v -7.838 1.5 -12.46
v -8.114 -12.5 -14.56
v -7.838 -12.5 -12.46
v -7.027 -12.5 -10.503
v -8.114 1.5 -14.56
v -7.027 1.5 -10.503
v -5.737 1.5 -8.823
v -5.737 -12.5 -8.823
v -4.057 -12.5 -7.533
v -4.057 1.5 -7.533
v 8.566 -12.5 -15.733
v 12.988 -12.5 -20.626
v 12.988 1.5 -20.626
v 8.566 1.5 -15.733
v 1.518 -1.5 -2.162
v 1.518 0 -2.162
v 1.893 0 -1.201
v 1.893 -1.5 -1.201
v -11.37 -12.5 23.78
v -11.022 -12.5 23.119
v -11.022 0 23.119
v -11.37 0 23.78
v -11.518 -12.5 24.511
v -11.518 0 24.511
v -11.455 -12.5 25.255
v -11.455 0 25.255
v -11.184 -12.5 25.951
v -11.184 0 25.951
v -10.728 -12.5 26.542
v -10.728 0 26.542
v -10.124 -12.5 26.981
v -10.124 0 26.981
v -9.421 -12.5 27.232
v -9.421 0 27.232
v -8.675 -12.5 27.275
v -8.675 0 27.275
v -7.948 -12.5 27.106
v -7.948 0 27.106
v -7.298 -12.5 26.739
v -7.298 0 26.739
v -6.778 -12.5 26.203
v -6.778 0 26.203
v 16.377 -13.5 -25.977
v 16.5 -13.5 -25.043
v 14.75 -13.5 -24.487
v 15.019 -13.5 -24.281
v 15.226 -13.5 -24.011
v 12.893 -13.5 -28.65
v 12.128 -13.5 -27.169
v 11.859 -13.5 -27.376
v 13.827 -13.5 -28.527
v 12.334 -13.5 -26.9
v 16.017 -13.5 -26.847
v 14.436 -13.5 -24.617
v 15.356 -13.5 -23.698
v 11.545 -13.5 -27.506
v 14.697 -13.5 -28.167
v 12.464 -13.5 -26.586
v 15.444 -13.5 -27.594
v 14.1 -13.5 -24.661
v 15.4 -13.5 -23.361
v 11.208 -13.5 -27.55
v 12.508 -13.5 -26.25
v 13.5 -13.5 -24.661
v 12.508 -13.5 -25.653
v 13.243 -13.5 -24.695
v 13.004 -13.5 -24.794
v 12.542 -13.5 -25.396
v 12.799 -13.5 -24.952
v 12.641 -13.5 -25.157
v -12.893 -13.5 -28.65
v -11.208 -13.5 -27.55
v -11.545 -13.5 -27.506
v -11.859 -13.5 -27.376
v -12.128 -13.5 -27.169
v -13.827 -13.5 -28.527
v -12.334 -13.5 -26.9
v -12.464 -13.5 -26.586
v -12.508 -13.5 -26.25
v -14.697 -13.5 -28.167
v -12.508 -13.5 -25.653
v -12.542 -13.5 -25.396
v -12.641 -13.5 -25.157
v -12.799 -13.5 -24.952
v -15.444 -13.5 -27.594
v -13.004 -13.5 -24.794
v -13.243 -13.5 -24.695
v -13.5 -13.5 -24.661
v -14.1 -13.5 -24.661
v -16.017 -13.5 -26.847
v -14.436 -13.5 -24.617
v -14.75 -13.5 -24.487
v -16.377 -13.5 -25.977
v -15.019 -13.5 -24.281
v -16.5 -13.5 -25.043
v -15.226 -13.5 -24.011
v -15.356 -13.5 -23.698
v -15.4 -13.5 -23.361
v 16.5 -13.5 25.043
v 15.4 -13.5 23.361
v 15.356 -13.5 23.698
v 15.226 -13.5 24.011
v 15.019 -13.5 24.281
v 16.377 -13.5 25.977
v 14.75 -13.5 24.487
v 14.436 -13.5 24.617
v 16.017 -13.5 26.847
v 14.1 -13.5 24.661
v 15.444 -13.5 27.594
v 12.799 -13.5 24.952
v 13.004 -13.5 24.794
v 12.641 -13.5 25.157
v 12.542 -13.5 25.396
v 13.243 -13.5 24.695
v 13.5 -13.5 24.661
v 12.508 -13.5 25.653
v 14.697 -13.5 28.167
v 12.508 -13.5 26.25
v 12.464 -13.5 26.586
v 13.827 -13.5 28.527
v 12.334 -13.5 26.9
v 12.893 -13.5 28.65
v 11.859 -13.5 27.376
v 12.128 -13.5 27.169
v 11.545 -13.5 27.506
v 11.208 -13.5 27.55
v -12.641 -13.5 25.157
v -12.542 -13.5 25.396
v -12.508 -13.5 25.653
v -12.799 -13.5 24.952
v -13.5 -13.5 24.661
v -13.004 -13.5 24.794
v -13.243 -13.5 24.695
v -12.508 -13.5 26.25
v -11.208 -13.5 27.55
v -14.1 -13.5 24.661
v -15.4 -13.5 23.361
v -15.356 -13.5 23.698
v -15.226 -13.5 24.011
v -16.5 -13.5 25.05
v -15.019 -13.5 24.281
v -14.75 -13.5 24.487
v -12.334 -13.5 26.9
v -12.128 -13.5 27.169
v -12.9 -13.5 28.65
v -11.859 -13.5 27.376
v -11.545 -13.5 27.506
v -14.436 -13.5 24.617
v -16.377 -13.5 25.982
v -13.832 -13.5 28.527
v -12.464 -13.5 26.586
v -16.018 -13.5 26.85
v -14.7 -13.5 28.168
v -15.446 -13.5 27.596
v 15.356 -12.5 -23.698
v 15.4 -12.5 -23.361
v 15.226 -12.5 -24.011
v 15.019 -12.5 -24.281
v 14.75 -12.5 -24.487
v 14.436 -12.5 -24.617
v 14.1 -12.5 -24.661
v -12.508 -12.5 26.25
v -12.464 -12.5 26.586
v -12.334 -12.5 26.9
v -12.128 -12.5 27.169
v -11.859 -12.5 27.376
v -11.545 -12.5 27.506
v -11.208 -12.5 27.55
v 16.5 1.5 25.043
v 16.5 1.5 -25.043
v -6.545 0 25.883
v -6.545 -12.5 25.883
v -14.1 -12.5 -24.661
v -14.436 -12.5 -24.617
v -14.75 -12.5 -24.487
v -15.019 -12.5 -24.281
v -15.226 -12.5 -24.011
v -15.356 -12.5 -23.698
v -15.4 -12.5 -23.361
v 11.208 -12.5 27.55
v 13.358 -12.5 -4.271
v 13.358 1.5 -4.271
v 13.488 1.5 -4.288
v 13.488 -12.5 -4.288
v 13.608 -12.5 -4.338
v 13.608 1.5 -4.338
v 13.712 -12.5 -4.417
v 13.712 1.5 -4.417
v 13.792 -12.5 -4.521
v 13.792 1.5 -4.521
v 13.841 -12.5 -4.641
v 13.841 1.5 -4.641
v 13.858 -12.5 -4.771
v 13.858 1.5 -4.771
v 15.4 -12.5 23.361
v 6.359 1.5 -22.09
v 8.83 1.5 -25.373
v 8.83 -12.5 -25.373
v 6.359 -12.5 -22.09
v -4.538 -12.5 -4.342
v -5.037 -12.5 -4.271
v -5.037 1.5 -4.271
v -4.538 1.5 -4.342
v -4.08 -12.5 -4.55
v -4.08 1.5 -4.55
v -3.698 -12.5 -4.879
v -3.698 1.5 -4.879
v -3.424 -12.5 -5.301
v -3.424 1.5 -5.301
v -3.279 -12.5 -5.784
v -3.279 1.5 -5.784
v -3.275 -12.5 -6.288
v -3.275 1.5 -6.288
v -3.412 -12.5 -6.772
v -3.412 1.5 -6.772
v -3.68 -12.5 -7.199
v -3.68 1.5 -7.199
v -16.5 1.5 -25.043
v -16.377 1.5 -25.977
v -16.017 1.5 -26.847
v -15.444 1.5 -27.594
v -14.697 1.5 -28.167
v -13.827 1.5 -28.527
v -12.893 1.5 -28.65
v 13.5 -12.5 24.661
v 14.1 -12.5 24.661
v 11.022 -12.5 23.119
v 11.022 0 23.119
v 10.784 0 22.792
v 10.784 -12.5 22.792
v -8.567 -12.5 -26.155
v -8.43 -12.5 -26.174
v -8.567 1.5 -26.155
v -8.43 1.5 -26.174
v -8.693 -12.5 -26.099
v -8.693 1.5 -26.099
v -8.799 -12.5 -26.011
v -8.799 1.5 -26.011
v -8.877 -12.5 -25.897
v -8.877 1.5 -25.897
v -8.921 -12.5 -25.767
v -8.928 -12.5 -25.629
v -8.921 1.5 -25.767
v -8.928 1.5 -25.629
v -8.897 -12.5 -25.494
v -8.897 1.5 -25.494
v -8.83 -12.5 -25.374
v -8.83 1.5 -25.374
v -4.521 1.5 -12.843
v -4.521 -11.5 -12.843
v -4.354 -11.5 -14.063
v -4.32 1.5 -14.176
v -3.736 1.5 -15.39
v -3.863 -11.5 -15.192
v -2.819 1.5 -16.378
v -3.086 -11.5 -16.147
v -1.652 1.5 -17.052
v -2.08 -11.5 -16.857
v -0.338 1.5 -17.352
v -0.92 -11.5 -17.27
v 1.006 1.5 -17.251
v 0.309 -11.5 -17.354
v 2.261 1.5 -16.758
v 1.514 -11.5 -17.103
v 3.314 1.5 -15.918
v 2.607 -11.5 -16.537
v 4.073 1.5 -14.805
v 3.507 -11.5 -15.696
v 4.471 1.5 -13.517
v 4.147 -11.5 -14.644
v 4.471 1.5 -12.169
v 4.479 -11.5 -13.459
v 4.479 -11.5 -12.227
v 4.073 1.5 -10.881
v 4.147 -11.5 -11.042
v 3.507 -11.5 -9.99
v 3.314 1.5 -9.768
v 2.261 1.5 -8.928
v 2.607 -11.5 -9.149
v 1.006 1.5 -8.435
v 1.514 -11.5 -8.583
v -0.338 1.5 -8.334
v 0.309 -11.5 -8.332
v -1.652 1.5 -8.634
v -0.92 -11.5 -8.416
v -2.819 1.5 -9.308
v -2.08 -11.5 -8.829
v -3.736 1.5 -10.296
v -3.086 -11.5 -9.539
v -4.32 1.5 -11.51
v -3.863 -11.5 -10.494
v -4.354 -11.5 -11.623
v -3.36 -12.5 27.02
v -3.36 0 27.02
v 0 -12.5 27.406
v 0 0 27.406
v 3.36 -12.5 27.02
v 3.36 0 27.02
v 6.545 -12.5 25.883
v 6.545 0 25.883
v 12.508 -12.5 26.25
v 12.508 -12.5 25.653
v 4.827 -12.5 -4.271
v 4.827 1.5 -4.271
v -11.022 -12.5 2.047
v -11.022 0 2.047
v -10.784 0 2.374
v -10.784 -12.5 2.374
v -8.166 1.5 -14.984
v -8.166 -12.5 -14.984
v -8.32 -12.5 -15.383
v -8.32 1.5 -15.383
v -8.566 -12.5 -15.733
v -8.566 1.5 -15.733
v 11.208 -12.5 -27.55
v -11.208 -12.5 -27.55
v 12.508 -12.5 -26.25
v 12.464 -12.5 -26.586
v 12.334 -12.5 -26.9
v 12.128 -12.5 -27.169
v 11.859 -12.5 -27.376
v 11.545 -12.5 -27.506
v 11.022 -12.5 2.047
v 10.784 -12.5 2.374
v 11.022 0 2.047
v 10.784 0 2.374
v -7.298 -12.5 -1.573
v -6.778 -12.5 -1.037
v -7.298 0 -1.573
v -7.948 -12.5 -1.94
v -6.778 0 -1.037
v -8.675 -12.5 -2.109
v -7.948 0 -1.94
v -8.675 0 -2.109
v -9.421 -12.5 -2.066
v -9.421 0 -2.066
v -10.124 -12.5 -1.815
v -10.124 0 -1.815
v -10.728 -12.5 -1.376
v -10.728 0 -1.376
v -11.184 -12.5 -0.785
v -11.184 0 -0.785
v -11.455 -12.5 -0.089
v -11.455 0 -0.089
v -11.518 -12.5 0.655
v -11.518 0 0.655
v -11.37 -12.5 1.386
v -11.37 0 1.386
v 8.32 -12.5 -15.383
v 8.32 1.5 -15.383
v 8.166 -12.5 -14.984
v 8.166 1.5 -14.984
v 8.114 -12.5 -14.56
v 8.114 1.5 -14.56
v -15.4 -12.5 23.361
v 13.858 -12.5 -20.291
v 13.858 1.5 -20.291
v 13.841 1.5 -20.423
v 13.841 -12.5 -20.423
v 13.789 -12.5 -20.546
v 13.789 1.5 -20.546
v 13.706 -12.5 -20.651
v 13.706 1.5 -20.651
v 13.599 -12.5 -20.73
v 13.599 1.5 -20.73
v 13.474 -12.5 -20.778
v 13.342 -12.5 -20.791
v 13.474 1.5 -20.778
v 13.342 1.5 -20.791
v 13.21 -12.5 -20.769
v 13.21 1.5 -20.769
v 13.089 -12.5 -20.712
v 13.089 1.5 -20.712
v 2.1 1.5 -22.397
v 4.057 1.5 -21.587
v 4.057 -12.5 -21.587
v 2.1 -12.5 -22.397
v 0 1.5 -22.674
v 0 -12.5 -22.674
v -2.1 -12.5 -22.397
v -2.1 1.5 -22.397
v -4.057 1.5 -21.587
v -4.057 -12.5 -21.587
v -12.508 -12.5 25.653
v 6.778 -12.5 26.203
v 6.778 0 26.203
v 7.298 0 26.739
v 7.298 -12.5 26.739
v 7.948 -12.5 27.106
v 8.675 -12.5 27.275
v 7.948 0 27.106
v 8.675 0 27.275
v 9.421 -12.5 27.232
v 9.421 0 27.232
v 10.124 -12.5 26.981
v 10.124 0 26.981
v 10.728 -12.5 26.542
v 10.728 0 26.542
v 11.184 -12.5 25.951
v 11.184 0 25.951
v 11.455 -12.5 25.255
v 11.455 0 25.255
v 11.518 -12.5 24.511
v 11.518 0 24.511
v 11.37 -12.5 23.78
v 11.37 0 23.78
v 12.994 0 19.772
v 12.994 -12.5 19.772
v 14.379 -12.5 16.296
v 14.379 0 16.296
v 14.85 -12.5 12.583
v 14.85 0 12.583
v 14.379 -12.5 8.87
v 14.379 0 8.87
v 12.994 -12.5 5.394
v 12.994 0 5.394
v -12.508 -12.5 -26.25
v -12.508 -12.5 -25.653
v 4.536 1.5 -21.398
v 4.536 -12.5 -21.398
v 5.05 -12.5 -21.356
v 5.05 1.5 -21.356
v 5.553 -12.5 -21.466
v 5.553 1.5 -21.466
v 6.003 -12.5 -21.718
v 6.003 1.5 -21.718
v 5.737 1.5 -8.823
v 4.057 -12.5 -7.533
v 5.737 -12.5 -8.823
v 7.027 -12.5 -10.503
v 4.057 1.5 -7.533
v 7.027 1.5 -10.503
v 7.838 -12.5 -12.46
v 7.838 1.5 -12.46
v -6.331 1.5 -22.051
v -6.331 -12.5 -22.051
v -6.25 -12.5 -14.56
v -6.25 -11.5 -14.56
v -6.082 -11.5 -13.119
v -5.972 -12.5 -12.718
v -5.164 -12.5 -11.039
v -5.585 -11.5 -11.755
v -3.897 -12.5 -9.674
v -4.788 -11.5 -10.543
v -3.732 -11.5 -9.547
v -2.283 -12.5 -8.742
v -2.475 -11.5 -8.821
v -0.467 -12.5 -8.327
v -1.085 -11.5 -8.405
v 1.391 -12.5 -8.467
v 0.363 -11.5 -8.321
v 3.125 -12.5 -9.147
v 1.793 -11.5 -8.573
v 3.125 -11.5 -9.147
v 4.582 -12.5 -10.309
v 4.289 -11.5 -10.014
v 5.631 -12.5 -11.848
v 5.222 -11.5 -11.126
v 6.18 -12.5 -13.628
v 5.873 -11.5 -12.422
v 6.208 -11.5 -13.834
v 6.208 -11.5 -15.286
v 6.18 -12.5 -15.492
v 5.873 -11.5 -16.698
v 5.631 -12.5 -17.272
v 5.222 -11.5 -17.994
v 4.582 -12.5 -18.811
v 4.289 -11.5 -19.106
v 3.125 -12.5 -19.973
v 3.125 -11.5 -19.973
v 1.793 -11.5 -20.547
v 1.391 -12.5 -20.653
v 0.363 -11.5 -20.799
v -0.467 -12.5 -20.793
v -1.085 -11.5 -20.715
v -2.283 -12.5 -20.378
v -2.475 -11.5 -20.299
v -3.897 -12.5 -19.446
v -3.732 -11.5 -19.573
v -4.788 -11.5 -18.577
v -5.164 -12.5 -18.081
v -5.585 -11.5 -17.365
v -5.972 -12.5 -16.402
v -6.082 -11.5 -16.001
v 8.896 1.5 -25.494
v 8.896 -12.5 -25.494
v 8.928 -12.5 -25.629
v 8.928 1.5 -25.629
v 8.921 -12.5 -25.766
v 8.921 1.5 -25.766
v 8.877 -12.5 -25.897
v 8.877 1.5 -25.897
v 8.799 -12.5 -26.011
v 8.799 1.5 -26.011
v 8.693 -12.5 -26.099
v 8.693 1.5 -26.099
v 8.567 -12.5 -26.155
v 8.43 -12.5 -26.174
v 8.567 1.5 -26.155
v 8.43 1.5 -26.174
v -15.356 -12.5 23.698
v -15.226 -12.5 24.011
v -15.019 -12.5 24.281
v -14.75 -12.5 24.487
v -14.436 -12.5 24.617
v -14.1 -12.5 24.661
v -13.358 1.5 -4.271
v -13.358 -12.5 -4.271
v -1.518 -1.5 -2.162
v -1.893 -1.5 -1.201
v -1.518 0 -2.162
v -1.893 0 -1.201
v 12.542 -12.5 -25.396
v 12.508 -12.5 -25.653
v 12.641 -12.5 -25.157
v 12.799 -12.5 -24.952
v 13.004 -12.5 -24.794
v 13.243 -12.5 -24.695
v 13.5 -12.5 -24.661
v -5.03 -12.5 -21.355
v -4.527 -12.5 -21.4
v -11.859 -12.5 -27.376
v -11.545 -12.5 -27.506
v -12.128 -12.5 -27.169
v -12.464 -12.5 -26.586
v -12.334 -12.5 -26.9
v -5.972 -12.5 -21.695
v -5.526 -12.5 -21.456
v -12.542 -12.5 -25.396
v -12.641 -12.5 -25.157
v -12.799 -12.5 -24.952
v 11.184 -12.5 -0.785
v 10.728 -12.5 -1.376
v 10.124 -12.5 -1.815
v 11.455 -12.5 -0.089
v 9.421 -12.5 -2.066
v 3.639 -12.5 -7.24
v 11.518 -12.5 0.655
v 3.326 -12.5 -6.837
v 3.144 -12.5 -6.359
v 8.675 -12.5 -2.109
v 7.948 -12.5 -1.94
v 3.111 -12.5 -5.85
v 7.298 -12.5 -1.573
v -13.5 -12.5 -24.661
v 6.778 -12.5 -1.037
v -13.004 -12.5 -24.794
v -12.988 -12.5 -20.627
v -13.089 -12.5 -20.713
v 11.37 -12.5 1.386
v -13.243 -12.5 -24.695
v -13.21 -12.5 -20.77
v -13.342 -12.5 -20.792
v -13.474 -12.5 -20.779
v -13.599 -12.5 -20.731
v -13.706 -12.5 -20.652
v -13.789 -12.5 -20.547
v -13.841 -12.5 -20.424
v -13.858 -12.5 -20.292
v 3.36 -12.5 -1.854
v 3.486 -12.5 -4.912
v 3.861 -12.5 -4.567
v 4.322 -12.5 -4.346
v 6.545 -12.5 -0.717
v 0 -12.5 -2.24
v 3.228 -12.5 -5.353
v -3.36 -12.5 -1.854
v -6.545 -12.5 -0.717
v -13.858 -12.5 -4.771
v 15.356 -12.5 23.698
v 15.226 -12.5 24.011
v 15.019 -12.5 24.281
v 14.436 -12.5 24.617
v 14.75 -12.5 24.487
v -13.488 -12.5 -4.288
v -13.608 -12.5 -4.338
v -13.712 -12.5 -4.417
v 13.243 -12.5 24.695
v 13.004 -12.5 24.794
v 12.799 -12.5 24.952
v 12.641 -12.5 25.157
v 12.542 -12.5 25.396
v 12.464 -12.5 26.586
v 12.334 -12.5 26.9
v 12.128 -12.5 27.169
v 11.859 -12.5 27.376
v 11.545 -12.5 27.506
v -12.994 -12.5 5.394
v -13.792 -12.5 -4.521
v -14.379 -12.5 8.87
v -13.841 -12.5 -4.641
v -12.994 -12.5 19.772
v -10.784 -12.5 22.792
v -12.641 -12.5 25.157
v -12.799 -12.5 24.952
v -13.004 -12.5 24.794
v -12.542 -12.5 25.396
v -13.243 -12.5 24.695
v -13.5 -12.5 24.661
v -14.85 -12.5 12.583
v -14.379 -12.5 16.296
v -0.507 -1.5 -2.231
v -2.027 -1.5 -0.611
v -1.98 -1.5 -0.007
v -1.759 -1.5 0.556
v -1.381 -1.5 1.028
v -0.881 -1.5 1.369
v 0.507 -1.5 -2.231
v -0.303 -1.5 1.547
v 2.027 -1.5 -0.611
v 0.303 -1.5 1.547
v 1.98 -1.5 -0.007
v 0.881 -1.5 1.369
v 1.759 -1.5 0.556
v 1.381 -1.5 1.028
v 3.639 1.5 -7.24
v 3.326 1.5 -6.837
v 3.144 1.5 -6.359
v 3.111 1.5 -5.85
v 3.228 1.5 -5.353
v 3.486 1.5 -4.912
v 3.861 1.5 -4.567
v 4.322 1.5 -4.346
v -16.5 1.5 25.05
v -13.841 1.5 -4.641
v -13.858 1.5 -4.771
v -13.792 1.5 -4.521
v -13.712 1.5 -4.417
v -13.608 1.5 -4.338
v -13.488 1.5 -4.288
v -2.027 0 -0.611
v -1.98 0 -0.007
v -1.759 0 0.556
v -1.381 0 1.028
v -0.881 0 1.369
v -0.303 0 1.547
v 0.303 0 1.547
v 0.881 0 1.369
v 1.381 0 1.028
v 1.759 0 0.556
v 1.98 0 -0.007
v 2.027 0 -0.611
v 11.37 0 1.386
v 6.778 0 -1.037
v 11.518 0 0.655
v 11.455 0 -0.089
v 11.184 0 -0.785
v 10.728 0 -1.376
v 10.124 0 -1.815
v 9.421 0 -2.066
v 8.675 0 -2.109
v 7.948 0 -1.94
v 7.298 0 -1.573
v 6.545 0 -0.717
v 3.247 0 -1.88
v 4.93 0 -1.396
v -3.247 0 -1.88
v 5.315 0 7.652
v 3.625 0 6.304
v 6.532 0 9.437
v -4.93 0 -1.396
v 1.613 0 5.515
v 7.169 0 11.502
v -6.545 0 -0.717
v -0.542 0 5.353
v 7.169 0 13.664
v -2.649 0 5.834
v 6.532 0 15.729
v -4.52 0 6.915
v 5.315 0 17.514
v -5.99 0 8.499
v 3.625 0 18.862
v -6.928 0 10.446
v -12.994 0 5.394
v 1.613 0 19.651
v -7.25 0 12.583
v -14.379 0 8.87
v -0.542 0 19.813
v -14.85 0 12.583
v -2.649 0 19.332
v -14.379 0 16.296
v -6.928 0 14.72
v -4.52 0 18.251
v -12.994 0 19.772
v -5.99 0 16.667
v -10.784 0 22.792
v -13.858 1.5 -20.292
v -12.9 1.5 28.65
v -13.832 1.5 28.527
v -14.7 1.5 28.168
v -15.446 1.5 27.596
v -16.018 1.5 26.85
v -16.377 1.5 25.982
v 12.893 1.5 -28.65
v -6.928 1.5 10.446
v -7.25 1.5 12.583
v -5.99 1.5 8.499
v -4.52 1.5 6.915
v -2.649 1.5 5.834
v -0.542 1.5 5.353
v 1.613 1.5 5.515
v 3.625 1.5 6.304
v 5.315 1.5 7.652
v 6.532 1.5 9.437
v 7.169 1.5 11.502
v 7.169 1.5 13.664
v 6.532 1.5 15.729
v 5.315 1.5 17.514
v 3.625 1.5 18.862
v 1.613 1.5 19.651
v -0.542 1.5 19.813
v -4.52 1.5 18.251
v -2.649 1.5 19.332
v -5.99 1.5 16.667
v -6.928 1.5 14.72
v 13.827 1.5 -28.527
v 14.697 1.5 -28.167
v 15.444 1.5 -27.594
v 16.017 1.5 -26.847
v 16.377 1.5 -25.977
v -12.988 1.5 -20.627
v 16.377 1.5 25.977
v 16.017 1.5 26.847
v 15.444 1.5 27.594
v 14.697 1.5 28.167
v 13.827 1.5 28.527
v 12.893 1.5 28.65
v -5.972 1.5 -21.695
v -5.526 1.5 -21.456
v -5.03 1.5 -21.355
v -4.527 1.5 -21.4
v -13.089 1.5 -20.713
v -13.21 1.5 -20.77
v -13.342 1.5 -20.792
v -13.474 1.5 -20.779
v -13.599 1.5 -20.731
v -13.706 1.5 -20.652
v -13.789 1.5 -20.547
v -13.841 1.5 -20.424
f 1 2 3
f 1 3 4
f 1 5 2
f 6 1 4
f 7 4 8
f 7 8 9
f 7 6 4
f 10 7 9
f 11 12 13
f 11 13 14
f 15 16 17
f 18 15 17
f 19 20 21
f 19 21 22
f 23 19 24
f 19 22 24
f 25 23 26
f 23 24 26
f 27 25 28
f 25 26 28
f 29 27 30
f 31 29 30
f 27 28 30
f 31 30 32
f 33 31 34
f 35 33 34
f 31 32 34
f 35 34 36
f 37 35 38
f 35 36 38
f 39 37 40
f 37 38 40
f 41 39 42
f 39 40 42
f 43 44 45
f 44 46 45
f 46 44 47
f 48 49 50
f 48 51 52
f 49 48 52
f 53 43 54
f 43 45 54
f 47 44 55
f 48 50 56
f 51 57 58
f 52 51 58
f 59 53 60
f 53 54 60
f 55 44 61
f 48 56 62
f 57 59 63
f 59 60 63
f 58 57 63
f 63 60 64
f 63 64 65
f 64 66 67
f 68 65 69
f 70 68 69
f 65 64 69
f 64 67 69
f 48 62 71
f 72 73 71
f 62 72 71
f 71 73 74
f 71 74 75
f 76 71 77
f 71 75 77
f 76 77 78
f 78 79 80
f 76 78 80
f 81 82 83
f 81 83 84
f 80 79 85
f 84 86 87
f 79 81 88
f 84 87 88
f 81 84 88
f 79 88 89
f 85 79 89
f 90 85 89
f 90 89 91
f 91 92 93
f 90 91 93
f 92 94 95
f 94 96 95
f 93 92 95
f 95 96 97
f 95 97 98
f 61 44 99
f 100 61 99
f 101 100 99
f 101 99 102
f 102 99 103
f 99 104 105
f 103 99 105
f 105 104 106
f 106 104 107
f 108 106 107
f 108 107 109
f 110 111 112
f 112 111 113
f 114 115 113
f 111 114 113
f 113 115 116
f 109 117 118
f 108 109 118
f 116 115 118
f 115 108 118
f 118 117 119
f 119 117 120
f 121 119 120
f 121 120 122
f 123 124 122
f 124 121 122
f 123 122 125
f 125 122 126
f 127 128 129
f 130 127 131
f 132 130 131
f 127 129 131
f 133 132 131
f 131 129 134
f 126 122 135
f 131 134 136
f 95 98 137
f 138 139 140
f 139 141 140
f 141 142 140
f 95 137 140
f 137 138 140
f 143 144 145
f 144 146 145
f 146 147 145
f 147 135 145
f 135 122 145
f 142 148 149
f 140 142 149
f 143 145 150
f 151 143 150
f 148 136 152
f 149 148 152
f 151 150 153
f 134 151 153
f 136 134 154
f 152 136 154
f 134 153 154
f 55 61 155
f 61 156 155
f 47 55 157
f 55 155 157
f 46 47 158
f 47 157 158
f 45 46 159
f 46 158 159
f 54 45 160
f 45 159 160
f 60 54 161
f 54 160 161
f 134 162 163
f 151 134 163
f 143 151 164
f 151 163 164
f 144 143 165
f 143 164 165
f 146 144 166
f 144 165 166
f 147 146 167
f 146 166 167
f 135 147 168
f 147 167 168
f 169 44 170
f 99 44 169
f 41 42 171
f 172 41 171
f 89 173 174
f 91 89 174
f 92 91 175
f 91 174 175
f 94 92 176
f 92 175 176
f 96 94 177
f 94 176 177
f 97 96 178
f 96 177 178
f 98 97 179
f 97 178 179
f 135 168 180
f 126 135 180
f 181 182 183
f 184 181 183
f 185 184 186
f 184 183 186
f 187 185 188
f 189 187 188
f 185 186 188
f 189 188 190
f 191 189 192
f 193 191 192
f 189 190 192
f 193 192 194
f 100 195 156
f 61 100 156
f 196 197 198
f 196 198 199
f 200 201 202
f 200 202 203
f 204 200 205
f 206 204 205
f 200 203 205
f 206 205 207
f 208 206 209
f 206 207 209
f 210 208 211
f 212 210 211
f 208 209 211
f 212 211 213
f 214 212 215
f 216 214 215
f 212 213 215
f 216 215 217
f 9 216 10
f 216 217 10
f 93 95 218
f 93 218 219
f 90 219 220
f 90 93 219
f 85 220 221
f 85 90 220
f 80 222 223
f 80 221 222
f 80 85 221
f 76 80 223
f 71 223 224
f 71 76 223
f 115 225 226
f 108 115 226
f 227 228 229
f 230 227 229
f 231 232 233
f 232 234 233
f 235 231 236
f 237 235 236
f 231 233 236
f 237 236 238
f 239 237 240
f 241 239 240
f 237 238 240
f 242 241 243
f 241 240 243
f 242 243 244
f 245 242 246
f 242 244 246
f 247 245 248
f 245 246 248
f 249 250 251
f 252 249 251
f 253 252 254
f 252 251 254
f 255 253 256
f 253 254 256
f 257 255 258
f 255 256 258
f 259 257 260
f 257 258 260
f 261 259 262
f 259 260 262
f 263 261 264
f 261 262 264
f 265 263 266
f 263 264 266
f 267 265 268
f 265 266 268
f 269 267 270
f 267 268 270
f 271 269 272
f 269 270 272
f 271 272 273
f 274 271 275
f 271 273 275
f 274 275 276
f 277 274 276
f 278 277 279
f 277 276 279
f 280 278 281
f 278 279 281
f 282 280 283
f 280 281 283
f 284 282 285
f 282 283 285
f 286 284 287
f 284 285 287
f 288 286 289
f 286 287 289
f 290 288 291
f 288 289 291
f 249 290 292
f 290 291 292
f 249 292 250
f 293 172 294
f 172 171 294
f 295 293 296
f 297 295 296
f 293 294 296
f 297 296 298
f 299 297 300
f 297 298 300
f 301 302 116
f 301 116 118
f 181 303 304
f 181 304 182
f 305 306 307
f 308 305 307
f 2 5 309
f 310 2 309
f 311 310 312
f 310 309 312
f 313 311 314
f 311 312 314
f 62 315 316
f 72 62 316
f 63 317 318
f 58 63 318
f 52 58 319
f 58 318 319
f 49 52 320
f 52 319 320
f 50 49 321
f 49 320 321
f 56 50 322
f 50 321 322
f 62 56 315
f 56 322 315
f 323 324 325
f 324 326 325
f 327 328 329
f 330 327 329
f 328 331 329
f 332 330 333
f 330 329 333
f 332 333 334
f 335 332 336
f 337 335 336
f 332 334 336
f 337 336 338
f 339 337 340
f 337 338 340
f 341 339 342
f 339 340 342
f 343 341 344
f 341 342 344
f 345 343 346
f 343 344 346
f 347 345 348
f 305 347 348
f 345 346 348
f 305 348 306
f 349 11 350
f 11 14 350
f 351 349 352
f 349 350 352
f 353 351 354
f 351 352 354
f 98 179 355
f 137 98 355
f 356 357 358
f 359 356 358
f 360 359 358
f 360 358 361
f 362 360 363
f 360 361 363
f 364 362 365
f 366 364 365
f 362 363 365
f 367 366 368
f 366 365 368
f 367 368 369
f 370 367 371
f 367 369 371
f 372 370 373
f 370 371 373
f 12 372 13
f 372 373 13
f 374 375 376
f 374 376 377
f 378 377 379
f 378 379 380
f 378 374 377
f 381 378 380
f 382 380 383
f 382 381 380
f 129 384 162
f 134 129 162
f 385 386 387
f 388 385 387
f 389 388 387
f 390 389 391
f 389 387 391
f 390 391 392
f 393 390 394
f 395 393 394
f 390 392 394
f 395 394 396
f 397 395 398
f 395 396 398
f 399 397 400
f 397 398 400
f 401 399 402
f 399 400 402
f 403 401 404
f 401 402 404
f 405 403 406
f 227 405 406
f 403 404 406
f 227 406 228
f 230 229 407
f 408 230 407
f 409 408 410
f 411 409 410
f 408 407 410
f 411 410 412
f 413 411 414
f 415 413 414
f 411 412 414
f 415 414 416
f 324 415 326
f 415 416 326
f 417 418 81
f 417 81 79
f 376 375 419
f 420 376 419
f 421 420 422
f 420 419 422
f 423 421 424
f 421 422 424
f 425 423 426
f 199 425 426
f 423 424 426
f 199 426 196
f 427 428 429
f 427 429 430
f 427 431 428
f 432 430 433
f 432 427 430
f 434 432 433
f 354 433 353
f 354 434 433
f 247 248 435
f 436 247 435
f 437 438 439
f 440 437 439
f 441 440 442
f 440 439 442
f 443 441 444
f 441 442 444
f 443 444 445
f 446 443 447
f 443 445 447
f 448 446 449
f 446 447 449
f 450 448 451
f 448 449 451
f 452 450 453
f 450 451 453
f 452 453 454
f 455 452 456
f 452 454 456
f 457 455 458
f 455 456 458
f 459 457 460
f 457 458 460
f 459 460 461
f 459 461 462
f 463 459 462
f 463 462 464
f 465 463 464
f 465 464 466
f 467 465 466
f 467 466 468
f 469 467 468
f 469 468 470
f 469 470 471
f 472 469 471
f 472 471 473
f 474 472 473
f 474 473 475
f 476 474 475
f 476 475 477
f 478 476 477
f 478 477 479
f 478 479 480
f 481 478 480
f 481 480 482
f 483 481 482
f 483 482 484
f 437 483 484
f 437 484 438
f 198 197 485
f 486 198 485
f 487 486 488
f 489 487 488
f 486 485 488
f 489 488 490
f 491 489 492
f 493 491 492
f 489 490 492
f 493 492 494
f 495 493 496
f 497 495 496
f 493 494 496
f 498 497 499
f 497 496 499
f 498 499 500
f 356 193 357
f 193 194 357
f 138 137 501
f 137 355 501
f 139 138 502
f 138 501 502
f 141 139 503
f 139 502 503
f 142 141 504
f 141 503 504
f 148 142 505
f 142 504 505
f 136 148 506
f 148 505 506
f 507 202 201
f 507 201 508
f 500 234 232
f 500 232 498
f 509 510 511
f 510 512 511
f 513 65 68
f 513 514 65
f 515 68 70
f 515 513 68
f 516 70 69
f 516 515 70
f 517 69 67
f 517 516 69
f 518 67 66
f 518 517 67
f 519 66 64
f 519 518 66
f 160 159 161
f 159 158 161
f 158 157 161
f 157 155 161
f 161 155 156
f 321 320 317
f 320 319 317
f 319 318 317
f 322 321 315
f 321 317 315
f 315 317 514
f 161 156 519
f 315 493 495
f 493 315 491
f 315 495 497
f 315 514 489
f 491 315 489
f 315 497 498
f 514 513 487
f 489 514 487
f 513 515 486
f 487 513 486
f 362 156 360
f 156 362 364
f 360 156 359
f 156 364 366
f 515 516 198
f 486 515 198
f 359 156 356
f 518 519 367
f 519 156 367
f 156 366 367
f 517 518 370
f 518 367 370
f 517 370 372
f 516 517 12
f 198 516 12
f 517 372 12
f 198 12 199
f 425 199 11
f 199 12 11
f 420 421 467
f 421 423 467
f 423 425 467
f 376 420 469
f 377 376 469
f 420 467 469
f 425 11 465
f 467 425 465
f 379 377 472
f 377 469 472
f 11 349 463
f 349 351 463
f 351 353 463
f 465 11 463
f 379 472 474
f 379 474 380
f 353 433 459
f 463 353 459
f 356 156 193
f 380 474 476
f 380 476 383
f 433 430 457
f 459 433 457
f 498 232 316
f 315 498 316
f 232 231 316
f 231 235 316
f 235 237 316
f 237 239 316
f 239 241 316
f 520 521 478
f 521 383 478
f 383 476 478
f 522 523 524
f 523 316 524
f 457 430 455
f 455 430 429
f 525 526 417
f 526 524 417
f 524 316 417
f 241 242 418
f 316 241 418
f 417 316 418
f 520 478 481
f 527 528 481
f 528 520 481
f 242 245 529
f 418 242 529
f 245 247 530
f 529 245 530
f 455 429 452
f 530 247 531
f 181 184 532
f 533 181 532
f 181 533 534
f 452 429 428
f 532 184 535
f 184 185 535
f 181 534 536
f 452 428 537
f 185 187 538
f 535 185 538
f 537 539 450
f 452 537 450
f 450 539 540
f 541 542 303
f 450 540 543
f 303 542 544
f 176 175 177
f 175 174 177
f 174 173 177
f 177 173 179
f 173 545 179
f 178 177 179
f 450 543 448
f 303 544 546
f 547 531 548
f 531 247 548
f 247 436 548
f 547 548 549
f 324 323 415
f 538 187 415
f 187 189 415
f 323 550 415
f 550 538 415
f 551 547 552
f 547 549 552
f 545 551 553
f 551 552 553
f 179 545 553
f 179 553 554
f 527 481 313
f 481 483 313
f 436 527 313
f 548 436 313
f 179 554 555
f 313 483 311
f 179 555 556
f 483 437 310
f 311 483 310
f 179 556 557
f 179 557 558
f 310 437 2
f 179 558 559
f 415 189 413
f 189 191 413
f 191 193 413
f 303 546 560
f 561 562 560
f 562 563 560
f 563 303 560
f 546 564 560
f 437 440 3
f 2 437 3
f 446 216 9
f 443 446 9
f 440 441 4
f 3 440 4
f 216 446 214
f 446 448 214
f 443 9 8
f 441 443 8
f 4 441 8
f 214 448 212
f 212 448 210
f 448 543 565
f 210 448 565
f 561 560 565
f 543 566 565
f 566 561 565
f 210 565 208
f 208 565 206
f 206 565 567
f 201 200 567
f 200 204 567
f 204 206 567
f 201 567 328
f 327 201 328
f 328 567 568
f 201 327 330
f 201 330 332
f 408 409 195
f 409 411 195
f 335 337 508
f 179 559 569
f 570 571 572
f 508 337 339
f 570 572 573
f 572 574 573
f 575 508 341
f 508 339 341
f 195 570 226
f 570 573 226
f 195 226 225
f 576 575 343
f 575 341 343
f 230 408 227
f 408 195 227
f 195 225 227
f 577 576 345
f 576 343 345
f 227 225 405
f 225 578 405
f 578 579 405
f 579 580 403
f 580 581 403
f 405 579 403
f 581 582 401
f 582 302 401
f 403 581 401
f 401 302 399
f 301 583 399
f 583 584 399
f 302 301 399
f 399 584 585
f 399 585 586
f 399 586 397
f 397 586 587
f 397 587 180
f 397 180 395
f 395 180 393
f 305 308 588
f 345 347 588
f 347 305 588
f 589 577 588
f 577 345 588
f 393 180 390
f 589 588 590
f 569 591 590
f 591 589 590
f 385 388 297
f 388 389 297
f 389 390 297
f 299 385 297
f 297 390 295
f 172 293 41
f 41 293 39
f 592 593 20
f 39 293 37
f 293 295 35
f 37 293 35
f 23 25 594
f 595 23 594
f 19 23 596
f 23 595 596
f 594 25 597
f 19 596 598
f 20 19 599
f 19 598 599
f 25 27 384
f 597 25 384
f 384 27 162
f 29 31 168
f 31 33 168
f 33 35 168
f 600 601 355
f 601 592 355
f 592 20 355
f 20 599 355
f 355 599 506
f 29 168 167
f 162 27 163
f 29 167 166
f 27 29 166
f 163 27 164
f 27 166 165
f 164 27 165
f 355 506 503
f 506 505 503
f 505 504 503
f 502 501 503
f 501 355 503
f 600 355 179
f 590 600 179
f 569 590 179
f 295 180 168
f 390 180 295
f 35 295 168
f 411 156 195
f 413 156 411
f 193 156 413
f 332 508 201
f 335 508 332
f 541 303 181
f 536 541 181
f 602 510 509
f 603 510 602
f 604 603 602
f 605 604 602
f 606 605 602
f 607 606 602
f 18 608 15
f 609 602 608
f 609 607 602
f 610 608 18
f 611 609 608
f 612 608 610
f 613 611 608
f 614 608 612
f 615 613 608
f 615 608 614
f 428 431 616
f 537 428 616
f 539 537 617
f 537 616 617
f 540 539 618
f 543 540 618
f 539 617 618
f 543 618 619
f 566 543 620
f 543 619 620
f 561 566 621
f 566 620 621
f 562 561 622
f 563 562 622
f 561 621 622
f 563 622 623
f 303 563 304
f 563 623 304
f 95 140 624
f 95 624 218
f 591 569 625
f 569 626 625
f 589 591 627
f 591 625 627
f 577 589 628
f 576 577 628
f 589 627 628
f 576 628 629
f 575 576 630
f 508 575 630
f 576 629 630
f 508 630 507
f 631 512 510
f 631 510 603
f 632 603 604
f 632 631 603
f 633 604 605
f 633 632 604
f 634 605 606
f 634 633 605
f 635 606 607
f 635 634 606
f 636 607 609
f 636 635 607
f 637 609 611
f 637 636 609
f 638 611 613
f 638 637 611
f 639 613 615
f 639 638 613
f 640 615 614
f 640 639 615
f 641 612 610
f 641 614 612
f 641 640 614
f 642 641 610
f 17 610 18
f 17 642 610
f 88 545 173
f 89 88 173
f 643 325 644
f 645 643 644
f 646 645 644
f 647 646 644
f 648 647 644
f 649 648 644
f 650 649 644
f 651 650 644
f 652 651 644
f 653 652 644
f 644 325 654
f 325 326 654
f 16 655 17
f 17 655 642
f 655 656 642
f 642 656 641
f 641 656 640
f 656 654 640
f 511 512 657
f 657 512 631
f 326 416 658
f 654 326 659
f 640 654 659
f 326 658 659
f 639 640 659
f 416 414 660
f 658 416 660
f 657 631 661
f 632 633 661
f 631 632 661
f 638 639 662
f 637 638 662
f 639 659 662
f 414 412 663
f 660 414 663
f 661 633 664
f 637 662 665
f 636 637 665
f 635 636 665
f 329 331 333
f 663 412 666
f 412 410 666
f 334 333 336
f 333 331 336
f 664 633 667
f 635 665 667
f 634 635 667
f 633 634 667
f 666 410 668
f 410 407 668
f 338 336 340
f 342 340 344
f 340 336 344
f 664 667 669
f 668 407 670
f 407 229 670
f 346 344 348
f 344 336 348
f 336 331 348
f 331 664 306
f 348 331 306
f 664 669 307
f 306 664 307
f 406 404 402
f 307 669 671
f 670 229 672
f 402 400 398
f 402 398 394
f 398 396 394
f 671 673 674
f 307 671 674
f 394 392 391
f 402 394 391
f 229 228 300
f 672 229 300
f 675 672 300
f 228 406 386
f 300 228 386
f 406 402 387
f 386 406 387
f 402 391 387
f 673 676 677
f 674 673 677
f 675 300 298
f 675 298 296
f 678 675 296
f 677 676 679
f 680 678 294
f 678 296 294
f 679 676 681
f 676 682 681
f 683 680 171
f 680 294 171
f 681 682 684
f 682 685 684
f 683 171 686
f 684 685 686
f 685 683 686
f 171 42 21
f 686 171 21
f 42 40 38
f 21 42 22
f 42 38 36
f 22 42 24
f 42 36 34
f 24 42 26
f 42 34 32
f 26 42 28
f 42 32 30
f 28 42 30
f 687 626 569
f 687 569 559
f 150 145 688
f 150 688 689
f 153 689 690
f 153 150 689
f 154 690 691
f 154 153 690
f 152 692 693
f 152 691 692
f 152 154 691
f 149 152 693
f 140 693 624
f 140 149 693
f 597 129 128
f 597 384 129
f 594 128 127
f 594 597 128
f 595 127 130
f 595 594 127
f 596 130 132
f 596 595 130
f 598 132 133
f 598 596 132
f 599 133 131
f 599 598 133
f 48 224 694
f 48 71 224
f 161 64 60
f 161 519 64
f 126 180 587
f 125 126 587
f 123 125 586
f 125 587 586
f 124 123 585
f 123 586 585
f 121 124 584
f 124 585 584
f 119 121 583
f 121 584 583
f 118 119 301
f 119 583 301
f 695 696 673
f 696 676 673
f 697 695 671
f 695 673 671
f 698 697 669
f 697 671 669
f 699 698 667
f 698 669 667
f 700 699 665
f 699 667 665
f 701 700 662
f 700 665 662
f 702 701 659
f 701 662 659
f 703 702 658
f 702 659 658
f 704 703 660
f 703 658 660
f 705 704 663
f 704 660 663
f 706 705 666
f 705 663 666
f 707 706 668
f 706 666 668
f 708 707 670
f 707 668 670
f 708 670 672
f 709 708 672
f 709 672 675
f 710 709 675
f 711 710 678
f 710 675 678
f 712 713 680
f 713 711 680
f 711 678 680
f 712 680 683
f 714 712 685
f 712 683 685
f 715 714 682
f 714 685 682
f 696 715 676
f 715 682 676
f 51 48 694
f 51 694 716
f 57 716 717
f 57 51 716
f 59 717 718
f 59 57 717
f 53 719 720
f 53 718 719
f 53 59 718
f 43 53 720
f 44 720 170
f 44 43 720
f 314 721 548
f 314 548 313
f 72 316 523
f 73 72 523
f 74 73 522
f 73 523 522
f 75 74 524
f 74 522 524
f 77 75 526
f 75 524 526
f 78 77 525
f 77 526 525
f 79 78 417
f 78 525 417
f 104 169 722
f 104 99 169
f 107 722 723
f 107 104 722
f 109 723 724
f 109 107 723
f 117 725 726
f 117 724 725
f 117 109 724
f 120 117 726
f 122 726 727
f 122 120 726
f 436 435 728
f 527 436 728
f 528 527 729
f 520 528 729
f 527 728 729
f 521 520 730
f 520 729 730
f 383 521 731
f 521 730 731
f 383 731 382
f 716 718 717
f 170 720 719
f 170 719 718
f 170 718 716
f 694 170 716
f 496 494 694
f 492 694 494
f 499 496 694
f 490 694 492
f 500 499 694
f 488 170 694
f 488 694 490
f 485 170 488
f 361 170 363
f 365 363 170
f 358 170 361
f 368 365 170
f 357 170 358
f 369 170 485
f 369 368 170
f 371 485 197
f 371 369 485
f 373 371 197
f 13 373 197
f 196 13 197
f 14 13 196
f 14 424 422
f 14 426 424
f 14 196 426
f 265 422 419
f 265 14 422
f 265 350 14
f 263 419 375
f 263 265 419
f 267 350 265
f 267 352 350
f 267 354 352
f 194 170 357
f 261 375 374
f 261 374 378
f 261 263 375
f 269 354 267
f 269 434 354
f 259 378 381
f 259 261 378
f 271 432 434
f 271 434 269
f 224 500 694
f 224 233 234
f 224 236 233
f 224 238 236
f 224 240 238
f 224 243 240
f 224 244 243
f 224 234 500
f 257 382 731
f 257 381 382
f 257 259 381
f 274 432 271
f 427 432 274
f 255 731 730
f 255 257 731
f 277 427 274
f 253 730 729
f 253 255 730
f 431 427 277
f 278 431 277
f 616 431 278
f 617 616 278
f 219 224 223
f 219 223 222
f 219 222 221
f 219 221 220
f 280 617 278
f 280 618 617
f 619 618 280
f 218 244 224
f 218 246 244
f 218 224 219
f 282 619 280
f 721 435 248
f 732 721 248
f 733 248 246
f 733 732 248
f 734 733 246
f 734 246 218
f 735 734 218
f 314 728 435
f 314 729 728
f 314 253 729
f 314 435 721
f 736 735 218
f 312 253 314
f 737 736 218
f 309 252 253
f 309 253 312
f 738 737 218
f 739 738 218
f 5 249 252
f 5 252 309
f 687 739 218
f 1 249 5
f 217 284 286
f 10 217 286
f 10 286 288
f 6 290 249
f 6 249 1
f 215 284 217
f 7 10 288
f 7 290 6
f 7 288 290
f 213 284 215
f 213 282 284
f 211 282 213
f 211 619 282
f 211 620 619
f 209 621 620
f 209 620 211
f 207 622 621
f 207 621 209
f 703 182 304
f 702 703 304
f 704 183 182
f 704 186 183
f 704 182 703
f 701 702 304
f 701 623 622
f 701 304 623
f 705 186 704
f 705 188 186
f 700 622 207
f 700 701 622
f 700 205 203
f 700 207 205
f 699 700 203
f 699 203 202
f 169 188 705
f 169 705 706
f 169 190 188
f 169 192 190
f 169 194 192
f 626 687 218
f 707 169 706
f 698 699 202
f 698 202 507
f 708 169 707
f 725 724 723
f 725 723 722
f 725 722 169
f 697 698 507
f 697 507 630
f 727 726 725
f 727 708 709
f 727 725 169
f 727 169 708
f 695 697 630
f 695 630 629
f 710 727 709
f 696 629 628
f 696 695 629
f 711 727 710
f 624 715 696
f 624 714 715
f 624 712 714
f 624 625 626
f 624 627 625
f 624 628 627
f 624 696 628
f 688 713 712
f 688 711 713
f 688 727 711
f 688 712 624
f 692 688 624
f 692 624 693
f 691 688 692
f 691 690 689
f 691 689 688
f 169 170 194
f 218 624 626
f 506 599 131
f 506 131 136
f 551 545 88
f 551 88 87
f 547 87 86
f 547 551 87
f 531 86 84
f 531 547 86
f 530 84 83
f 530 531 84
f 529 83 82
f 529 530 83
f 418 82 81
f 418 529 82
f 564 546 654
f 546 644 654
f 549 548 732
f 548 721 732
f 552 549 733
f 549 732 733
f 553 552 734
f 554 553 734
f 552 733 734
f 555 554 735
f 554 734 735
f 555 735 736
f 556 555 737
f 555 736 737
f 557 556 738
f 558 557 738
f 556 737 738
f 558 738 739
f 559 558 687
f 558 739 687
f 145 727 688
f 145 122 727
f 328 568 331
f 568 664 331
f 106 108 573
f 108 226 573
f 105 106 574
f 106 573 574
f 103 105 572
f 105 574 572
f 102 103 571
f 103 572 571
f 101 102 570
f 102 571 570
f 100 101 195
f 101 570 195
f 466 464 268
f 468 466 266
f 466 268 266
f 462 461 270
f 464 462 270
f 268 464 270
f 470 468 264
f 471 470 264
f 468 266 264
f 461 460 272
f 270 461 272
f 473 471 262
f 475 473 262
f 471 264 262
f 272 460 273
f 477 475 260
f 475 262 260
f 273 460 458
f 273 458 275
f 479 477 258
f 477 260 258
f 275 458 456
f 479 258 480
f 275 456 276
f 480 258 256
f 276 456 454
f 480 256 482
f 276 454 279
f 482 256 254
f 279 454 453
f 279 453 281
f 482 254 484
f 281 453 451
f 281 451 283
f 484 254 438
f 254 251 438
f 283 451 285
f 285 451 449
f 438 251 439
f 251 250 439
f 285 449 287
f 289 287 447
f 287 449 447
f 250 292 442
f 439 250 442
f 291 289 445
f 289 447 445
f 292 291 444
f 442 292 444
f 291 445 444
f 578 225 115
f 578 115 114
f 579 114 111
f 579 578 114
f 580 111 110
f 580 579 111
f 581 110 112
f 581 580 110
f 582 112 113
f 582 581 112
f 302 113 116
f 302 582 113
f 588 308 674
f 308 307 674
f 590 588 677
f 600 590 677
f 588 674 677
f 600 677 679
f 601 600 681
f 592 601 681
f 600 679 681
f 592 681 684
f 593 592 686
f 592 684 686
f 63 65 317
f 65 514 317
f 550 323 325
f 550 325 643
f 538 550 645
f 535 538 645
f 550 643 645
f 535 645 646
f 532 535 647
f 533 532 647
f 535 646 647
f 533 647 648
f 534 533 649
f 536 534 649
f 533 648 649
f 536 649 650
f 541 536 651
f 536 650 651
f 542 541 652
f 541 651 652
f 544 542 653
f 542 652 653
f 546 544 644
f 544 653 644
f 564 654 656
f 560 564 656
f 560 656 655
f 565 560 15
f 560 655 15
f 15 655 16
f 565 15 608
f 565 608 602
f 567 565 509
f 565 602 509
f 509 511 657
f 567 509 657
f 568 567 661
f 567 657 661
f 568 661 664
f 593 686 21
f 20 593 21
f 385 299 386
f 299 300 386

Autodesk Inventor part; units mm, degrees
ref_plane "YZ Plane" through (0, 0, 0) normal (1, 0, 0) x (0, 1, 0)
ref_plane "XZ Plane" through (0, 0, 0) normal (0, 1, 0) x (-1, 0, 0)
ref_plane "XY Plane" through (0, 0, 0) normal (0, 0, 1) x (1, 0, 0)
sketch "Sketch5" plane through (0, 0, 0) normal (0, 1, 0) x (-1, 0, 0)
  line L0 (-12.8932, 28.65) -> (12.9, 28.65)
  line L1 (16.5, 25.05) -> (16.5, -25.0432)
  line L2 (12.8932, -28.65) -> (-12.8932, -28.65)
  line L3 (-16.5, -25.0432) -> (-16.5, 25.0432)
  line L4 (-16.5, 28.65) -> (16.5, -28.65) construction
  line L5 (16.5, 28.65) -> (-16.5, -28.65) construction
  arc A0 (16.5, 25.05) -> (12.9, 28.65) centre (12.9, 25.05) ccw
  line L6 (12.9, 28.65) -> (12.9, 25.05) construction
  line L7 (12.9, 25.05) -> (16.5, 25.05) construction
  arc A1 (12.8932, -28.65) -> (16.5, -25.0432) centre (12.8932, -25.0432) ccw
  arc A2 (-12.8932, 28.65) -> (-16.5, 25.0432) centre (-12.8932, 25.0432) ccw
  arc A3 (-16.5, -25.0432) -> (-12.8932, -28.65) centre (-12.8932, -25.0432) ccw
  circle A4 centre (13.5, 25.6528) radius 0.9915
  line L8 (11.2085, 27.55) -> (-11.2085, 27.55)
  arc A5 (-15.517, 25.05) -> (-15.517, 25.0432) centre (-12.8932, 25.0432) ccw
  line L9 (-15.4, 23.3613) -> (-15.4, -23.3613)
  line L10 (-11.2085, -27.55) -> (11.2085, -27.55)
  line L11 (15.4, -23.3613) -> (15.4, 23.3613)
  line L12 (12.5085, 25.6528) -> (12.5085, 26.25)
  line L13 (13.5, 24.6613) -> (14.1, 24.6613)
  arc A6 (12.5085, 26.25) -> (11.2085, 27.55) centre (11.2085, 26.25) ccw
  arc A7 (15.4, 23.3613) -> (14.1, 24.6613) centre (14.1, 23.3613) ccw
  line L14 (15.4, 0) -> (-15.4, 0) construction
  line L15 (0, 27.55) -> (0, -27.55) construction
  circle A8 centre (13.5, -25.6528) radius 0.9915
  line L16 (12.5085, -25.6528) -> (12.5085, -26.25)
  line L17 (13.5, -24.6613) -> (14.1, -24.6613)
  arc A9 (11.2085, -27.55) -> (12.5085, -26.25) centre (11.2085, -26.25) ccw
  arc A10 (14.1, -24.6613) -> (15.4, -23.3613) centre (14.1, -23.3613) ccw
  line L18 (0, -27.55) -> (0, 27.55) construction
  circle A11 centre (-13.5, 25.6528) radius 0.9915
  line L19 (-12.5085, 25.6528) -> (-12.5085, 26.25)
  line L20 (-13.5, 24.6613) -> (-14.1, 24.6613)
  arc A12 (-11.2085, 27.55) -> (-12.5085, 26.25) centre (-11.2085, 26.25) ccw
  arc A13 (-14.1, 24.6613) -> (-15.4, 23.3613) centre (-14.1, 23.3613) ccw
  arc A14 (-12.5085, -26.25) -> (-11.2085, -27.55) centre (-11.2085, -26.25) ccw
  line L21 (-12.5085, -25.6528) -> (-12.5085, -26.25)
  circle A15 centre (-13.5, -25.6528) radius 0.9915
  line L22 (-13.5, -24.6613) -> (-14.1, -24.6613)
  arc A16 (-15.4, -23.3613) -> (-14.1, -24.6613) centre (-14.1, -23.3613) ccw
  line L23 (-12.1355, -25.3386) -> (-12.1355, -25.333)
  line L24 (14.7139, 22.2154) -> (14.827, 22.0092) construction
  circle A17 centre (0, 12.583) radius 7.25
  arc A18 (6.3593, 25.2794) -> (-6.3593, 25.2794) centre (0, 12.583) ccw
  arc A19 (-6.3593, -0.1134) -> (6.3593, -0.1134) centre (0, 12.583) ccw
  line L25 (0, 12.583) -> (-6.3593, -0.1134) construction
  line L26 (0, 12.583) -> (6.3593, -0.1134) construction
  line L27 (0, 12.583) -> (0, -1.617) construction
  line L28 (0, 12.583) -> (16.5, 12.583) construction
  line L29 (-6.3593, -0.1134) -> (-6.3593, 25.2794) construction
  line L30 (6.3593, -0.1134) -> (6.3593, 25.2794) construction
  arc A20 (-6.3593, -0.1134) -> (-6.9877, -0.2666) centre (-6.5832, -0.5605) ccw
  line L31 (-6.9877, -0.2666) -> (-6.5832, -0.5605) construction
  line L32 (-6.5832, -0.5605) -> (-6.3593, -0.1134) construction
  line L33 (-6.9877, -0.2666) -> (-7.2816, -0.671)
  arc A21 (-10.5175, 1.6804) -> (-7.2816, -0.671) centre (-8.8995, 0.5047) ccw
  line L34 (-10.5175, 1.6804) -> (-10.2236, 2.0849)
  arc A22 (-10.2236, 2.0849) -> (-10.2728, 2.7402) centre (-10.6345, 2.3835) ccw
  line L35 (-10.2236, 2.0849) -> (-10.6345, 2.3835) construction
  line L36 (-10.6345, 2.3835) -> (-10.2728, 2.7402) construction
  arc A23 (6.9877, -0.2666) -> (6.3593, -0.1134) centre (6.5832, -0.5605) ccw
  line L37 (6.9877, -0.2666) -> (7.2816, -0.671)
  arc A24 (7.2816, -0.671) -> (10.5175, 1.6804) centre (8.8995, 0.5047) ccw
  line L38 (10.5175, 1.6804) -> (10.2236, 2.0849)
  arc A25 (10.2728, 2.7402) -> (10.2236, 2.0849) centre (10.6345, 2.3835) ccw
  arc A26 (-6.9877, 25.4326) -> (-6.3593, 25.2794) centre (-6.5832, 25.7265) ccw
  line L39 (-6.9877, 25.4326) -> (-7.2816, 25.837)
  arc A27 (-7.2816, 25.837) -> (-10.5175, 23.4856) centre (-8.8995, 24.6613) ccw
  line L40 (-10.5175, 23.4856) -> (-10.2236, 23.0811)
  arc A28 (-10.2728, 22.4258) -> (-10.2236, 23.0811) centre (-10.6345, 22.7825) ccw
  arc A29 (6.3593, 25.2794) -> (6.9877, 25.4326) centre (6.5832, 25.7265) ccw
  line L41 (6.9877, 25.4326) -> (7.2816, 25.837)
  arc A30 (10.5175, 23.4856) -> (7.2816, 25.837) centre (8.8995, 24.6613) ccw
  line L42 (10.5175, 23.4856) -> (10.2236, 23.0811)
  arc A31 (10.2236, 23.0811) -> (10.2728, 22.4258) centre (10.6345, 22.7825) ccw
  arc A32 (-10.2728, 22.4258) -> (-10.2728, 2.7402) centre (0, 12.583) ccw
  arc A33 (10.2728, 2.7402) -> (10.2728, 22.4258) centre (0, 12.583) ccw
  circle A34 centre (0, -12.96) radius 3.955
  line L43 (0, -12.96) -> (0, -18.96) construction
  circle A35 centre (13.5, -25.6528) radius 2
  line L44 (13.5, -25.6528) -> (13.5, -23.6528) construction
  line L45 (13.5, -25.6528) -> (11.5, -25.6528) construction
  line L46 (13.5, -23.6528) -> (15.3669, -23.6528) construction
  line L47 (11.5, -25.6528) -> (11.5, -27.5169) construction
  circle A36 centre (-13.5, -25.6528) radius 2
  circle A37 centre (-13.5, 25.6528) radius 2
  circle A38 centre (13.5, 25.6528) radius 2
  circle A39 centre (0, -12.843) radius 4.5212
  circle A40 centre (0, -14.56) radius 6.25
  line L48 (0, -14.56) -> (-5.807, -24.618) construction
  line L49 (0, -14.56) -> (5.807, -24.618) construction
  arc A41 (-4.057, -21.5869) -> (4.057, -21.5869) centre (0, -14.56) ccw
  arc A42 (-4.057, -21.5869) -> (-6.3593, -22.0899) centre (-4.932, -23.1025) ccw
  arc A43 (6.3306, -22.0506) -> (4.057, -21.5869) centre (4.932, -23.1025) ccw
  line L50 (0, -26.174) -> (-8.43, -26.174)
  line L51 (0, -26.174) -> (8.4301, -26.174)
  line L52 (8.8297, -25.3735) -> (6.3306, -22.0506)
  arc A44 (8.4301, -26.174) -> (8.8297, -25.3735) centre (8.4301, -25.674) ccw
  line L53 (-8.8295, -25.3734) -> (-6.3593, -22.0899)
  arc A45 (-8.8295, -25.3734) -> (-8.43, -26.174) centre (-8.43, -25.674) ccw
  line L54 (-4.8269, -4.2707) -> (-13.3585, -4.2707)
  line L55 (-13.8585, -4.7707) -> (-13.8585, -20.2911)
  line L56 (-12.9875, -20.6263) -> (-8.5656, -15.7334)
  arc A46 (-13.8585, -20.2911) -> (-12.9875, -20.6263) centre (-13.3585, -20.2911) ccw
  arc A47 (-13.3585, -4.2707) -> (-13.8585, -4.7707) centre (-13.3585, -4.7707) ccw
  line L57 (5.0371, -4.2707) -> (13.3585, -4.2707)
  line L58 (13.8585, -4.7707) -> (13.8585, -20.2921)
  line L59 (12.9875, -20.6273) -> (8.5655, -15.7332)
  arc A48 (12.9875, -20.6273) -> (13.8585, -20.2921) centre (13.3585, -20.2921) ccw
  arc A49 (13.8585, -4.7707) -> (13.3585, -4.2707) centre (13.3585, -4.7707) ccw
  arc A50 (8.114, -14.56) -> (4.057, -7.5331) centre (0, -14.56) ccw
  arc A51 (-4.057, -7.5331) -> (-8.114, -14.56) centre (0, -14.56) ccw
  arc A52 (8.114, -14.56) -> (8.5655, -15.7332) centre (9.864, -14.56) ccw
  arc A53 (5.0371, -4.2707) -> (4.057, -7.5331) centre (5.0371, -6.0491) ccw
  arc A54 (-4.057, -7.5331) -> (-4.8269, -4.2707) centre (-4.8269, -5.9927) ccw
  arc A55 (-8.5656, -15.7334) -> (-8.114, -14.56) centre (-9.864, -14.56) ccw
  line L60 (10.7841, 22.7925) -> (11.0216, 23.1193)
  arc A56 (11.0216, 23.1193) -> (6.7775, 26.2034) centre (8.8995, 24.6613) ccw
  line L61 (6.7775, 26.2034) -> (6.5448, 25.883)
  arc A57 (6.5448, 25.883) -> (-6.5448, 25.883) centre (0, 12.583) ccw
  line L62 (-6.5448, 25.883) -> (-6.7775, 26.2034)
  arc A58 (-6.7775, 26.2034) -> (-11.0216, 23.1193) centre (-8.8995, 24.6613) ccw
  line L63 (-11.0216, 23.1193) -> (-10.7841, 22.7925)
  arc A59 (-10.7841, 22.7925) -> (-10.7841, 2.3735) centre (0, 12.583) ccw
  line L64 (-10.7841, 2.3735) -> (-11.0216, 2.0467)
  arc A60 (-11.0216, 2.0467) -> (-6.7775, -1.0374) centre (-8.8995, 0.5047) ccw
  line L65 (-6.7775, -1.0374) -> (-6.5448, -0.717)
  arc A61 (-6.5448, -0.717) -> (6.5448, -0.717) centre (0, 12.583) ccw
  line L66 (6.5448, -0.717) -> (6.7775, -1.0374)
  arc A62 (6.7775, -1.0374) -> (11.0216, 2.0467) centre (8.8995, 0.5047) ccw
  line L67 (11.0216, 2.0467) -> (10.7841, 2.3735)
  arc A63 (10.7841, 2.3735) -> (10.7841, 22.7925) centre (0, 12.583) ccw
  point P0 (0, 0)
  point P1 (0, 0)
  point P2 (-2.4, 0)
  point P3 (-12.1591, 27.1367)
  point P4 (-14.9852, 24.3133)
  point P5 (-14.9852, -24.3133)
  point P6 (-12.1591, -27.1367)
  point P7 (12.1591, -27.1367)
  point P8 (14.9852, -24.3133)
  point P9 (14.9852, 24.3133)
  point P10 (12.1591, 27.1367)
  point P11 (5.807, -24.501)
  point P12 (13.8585, -4.2707)
  dimension "d61" = 57.3
  dimension "d62" = 33
  dimension "d63" = 3.6
  dimension "d64" = 90
  dimension "d65" = 3.6068
  dimension "d66" = 3.6068
  dimension "d67" = 2.9972
  dimension "d68" = 3
  dimension "d69" = 1.983
  dimension "d70" = 1.1
  dimension "d71" = 1.3
  dimension "d74" = 22.417
  dimension "d84" = 14.5
  dimension "d85" = 28.4
  dimension "d87" = 53.21
  dimension "d88" = 0.5
  dimension "d89" = 80.6
  dimension "d90" = 0.5
  dimension "d91" = 2
  dimension "d92" = 0.508
  dimension "d93" = 80.6
  dimension "d98" = 25.543
  dimension "d99" = 7.91
  dimension "d116" = 4
  dimension "d117" = 4
  dimension "d118" = 4
  dimension "d119" = 4
  dimension "d128" = 9.0424
  dimension "d129" = 1.6
  dimension "d130" = 12.5
  dimension "d131" = 60
  dimension "d132" = 30
  dimension "d145" = 0.5
  dimension "d146" = 0.5
  dimension "d147" = 0.5
  dimension "d148" = 0.5
  dimension "d151" = 360
  dimension "d192" = 1.1
  dimension "d193" = 1.1
  dimension "d195" = 1.1
extrude "Extrusion6" add sketch "Sketch5" against normal blind 13.5 contours L0 A0 L1 A1 L2 A3 L3 A2 | A4 | A4 L12 A6 A38 A7 L13 | A4 L13 A7 A38 A6 L12 | A38 A7 L11 A10 A35 A9 L10 A14 A36 A16 L9 A13 A37 A12 L8 A6 | A37 A13 L20 A11 L19 A12 | A12 L19 A11 L20 A13 A37 | A35 A9 L16 A8 L17 A10 | A10 L17 A8 L16 A9 A35 | A11 | A8 | A36 A14 L21 A15 L22 A16 | A16 L22 A15 L21 A14 A36 | A15 | A29 L41 A30 L42 A31 A33 A25 L38 A24 L37 A23 A19 A20 L33 A21 L34 A22 A32 A28 L40 A27 L39 A26 A18 | A34 | A39 | A40 | A41 A43 L52 A44 L51 L50 A45 L53 A42 | A54 A51 A55 L56 A46 L55 A47 L54 | L57 A49 L58 A48 L59 A52 A50 A53 | A63 L67 A62 L66 A61 L65 A60 L64 A59 L63 A58 L62 A57 L61 A56 L60
extrude "Extrusion9" cut sketch "Sketch5" against normal blind 22 contours A4 L13 A7 A38 A6 L12 | A38 A7 L11 A10 A35 A9 L10 A14 A36 A16 L9 A13 A37 A12 L8 A6 | A37 A13 L20 A11 L19 A12 | A10 L17 A8 L16 A9 A35 | A36 A14 L21 A15 L22 A16 | A29 L41 A30 L42 A31 A33 A25 L38 A24 L37 A23 A19 A20 L33 A21 L34 A22 A32 A28 L40 A27 L39 A26 A18 | A34 | A39 | A40 | A41 A43 L52 A44 L51 L50 A45 L53 A42 | A54 A51 A55 L56 A46 L55 A47 L54 | L57 A49 L58 A48 L59 A52 A50 A53 | A63 L67 A62 L66 A61 L65 A60 L64 A59 L63 A58 L62 A57 L61 A56 L60 picked at (13.7589, 24.3277) picked at (-13.7763, 24.3295) picked at (13.7589, -24.3277) picked at (-13.7763, -24.3295)
extrude "Extrusion10" add sketch "Sketch5" against normal blind 12.5 contours A4 L13 A7 A38 A6 L12 | A37 A13 L20 A11 L19 A12 | A10 L17 A8 L16 A9 A35 | A36 A14 L21 A15 L22 A16 picked at (13.7589, 24.3277) picked at (-13.7763, 24.3295) picked at (13.7589, -24.3277) picked at (-13.7763, -24.3295)
extrude "Extrusion11" add sketch "Sketch5" against normal blind 11.5 contours A34 | A39 | A40
extrude "Extrusion12" cut sketch "Sketch5" against normal blind 11.5 contours A34 | A39
extrude "Extrusion13" add sketch "Sketch5" against normal blind 12.5 contours A38 A7 L11 A10 A35 A9 L10 A14 A36 A16 L9 A13 A37 A12 L8 A6
extrude "Extrusion14" add sketch "Sketch5" along normal blind 1.5 contours L0 A0 L1 A1 L2 A3 L3 A2 | A4 | A4 L12 A6 A38 A7 L13 | A4 L13 A7 A38 A6 L12 | A38 A7 L11 A10 A35 A9 L10 A14 A36 A16 L9 A13 A37 A12 L8 A6 | A37 A13 L20 A11 L19 A12 | A12 L19 A11 L20 A13 A37 | A35 A9 L16 A8 L17 A10 | A10 L17 A8 L16 A9 A35 | A11 | A8 | A36 A14 L21 A15 L22 A16 | A16 L22 A15 L21 A14 A36 | A15 | A29 L41 A30 L42 A31 A33 A25 L38 A24 L37 A23 A19 A20 L33 A21 L34 A22 A32 A28 L40 A27 L39 A26 A18 | A40 | A63 L67 A62 L66 A61 L65 A60 L64 A59 L63 A58 L62 A57 L61 A56 L60
sketch "Sketch13" plane through (0, 0, 0) normal (0, -1, 0) x (1, 0, 0)
  arc A0 (-6.5448, -0.717) -> (6.5448, -0.717) centre (0, 12.583) ccw construction
  line L0 (0, -2.2401) -> (0, 1.5699) construction
  arc A1 (1.048, -2.203) -> (-1.048, -2.203) centre (0, -0.4621) ccw
  arc A2 (-1.048, -2.203) -> (1.048, -2.203) centre (0, 12.583) ccw
  line L1 (1.5178, -2.1622) -> (1.8929, -1.2009)
  line L2 (-1.8929, -1.2009) -> (-1.5178, -2.1622)
  arc A3 (-1.5178, -2.1622) -> (1.5178, -2.1622) centre (0, 12.583) ccw
  point P0 (0, 0)
  point P1 (-1.048, -2.203)
  point P2 (1.048, -2.203)
  dimension "d204" = 3.81
  dimension "d205" = 2.032
extrude "Extrusion22" add sketch "Sketch13" along normal blind 1.5
properties part number "CapOGStyle" material "Plastic, Opaque Black"
